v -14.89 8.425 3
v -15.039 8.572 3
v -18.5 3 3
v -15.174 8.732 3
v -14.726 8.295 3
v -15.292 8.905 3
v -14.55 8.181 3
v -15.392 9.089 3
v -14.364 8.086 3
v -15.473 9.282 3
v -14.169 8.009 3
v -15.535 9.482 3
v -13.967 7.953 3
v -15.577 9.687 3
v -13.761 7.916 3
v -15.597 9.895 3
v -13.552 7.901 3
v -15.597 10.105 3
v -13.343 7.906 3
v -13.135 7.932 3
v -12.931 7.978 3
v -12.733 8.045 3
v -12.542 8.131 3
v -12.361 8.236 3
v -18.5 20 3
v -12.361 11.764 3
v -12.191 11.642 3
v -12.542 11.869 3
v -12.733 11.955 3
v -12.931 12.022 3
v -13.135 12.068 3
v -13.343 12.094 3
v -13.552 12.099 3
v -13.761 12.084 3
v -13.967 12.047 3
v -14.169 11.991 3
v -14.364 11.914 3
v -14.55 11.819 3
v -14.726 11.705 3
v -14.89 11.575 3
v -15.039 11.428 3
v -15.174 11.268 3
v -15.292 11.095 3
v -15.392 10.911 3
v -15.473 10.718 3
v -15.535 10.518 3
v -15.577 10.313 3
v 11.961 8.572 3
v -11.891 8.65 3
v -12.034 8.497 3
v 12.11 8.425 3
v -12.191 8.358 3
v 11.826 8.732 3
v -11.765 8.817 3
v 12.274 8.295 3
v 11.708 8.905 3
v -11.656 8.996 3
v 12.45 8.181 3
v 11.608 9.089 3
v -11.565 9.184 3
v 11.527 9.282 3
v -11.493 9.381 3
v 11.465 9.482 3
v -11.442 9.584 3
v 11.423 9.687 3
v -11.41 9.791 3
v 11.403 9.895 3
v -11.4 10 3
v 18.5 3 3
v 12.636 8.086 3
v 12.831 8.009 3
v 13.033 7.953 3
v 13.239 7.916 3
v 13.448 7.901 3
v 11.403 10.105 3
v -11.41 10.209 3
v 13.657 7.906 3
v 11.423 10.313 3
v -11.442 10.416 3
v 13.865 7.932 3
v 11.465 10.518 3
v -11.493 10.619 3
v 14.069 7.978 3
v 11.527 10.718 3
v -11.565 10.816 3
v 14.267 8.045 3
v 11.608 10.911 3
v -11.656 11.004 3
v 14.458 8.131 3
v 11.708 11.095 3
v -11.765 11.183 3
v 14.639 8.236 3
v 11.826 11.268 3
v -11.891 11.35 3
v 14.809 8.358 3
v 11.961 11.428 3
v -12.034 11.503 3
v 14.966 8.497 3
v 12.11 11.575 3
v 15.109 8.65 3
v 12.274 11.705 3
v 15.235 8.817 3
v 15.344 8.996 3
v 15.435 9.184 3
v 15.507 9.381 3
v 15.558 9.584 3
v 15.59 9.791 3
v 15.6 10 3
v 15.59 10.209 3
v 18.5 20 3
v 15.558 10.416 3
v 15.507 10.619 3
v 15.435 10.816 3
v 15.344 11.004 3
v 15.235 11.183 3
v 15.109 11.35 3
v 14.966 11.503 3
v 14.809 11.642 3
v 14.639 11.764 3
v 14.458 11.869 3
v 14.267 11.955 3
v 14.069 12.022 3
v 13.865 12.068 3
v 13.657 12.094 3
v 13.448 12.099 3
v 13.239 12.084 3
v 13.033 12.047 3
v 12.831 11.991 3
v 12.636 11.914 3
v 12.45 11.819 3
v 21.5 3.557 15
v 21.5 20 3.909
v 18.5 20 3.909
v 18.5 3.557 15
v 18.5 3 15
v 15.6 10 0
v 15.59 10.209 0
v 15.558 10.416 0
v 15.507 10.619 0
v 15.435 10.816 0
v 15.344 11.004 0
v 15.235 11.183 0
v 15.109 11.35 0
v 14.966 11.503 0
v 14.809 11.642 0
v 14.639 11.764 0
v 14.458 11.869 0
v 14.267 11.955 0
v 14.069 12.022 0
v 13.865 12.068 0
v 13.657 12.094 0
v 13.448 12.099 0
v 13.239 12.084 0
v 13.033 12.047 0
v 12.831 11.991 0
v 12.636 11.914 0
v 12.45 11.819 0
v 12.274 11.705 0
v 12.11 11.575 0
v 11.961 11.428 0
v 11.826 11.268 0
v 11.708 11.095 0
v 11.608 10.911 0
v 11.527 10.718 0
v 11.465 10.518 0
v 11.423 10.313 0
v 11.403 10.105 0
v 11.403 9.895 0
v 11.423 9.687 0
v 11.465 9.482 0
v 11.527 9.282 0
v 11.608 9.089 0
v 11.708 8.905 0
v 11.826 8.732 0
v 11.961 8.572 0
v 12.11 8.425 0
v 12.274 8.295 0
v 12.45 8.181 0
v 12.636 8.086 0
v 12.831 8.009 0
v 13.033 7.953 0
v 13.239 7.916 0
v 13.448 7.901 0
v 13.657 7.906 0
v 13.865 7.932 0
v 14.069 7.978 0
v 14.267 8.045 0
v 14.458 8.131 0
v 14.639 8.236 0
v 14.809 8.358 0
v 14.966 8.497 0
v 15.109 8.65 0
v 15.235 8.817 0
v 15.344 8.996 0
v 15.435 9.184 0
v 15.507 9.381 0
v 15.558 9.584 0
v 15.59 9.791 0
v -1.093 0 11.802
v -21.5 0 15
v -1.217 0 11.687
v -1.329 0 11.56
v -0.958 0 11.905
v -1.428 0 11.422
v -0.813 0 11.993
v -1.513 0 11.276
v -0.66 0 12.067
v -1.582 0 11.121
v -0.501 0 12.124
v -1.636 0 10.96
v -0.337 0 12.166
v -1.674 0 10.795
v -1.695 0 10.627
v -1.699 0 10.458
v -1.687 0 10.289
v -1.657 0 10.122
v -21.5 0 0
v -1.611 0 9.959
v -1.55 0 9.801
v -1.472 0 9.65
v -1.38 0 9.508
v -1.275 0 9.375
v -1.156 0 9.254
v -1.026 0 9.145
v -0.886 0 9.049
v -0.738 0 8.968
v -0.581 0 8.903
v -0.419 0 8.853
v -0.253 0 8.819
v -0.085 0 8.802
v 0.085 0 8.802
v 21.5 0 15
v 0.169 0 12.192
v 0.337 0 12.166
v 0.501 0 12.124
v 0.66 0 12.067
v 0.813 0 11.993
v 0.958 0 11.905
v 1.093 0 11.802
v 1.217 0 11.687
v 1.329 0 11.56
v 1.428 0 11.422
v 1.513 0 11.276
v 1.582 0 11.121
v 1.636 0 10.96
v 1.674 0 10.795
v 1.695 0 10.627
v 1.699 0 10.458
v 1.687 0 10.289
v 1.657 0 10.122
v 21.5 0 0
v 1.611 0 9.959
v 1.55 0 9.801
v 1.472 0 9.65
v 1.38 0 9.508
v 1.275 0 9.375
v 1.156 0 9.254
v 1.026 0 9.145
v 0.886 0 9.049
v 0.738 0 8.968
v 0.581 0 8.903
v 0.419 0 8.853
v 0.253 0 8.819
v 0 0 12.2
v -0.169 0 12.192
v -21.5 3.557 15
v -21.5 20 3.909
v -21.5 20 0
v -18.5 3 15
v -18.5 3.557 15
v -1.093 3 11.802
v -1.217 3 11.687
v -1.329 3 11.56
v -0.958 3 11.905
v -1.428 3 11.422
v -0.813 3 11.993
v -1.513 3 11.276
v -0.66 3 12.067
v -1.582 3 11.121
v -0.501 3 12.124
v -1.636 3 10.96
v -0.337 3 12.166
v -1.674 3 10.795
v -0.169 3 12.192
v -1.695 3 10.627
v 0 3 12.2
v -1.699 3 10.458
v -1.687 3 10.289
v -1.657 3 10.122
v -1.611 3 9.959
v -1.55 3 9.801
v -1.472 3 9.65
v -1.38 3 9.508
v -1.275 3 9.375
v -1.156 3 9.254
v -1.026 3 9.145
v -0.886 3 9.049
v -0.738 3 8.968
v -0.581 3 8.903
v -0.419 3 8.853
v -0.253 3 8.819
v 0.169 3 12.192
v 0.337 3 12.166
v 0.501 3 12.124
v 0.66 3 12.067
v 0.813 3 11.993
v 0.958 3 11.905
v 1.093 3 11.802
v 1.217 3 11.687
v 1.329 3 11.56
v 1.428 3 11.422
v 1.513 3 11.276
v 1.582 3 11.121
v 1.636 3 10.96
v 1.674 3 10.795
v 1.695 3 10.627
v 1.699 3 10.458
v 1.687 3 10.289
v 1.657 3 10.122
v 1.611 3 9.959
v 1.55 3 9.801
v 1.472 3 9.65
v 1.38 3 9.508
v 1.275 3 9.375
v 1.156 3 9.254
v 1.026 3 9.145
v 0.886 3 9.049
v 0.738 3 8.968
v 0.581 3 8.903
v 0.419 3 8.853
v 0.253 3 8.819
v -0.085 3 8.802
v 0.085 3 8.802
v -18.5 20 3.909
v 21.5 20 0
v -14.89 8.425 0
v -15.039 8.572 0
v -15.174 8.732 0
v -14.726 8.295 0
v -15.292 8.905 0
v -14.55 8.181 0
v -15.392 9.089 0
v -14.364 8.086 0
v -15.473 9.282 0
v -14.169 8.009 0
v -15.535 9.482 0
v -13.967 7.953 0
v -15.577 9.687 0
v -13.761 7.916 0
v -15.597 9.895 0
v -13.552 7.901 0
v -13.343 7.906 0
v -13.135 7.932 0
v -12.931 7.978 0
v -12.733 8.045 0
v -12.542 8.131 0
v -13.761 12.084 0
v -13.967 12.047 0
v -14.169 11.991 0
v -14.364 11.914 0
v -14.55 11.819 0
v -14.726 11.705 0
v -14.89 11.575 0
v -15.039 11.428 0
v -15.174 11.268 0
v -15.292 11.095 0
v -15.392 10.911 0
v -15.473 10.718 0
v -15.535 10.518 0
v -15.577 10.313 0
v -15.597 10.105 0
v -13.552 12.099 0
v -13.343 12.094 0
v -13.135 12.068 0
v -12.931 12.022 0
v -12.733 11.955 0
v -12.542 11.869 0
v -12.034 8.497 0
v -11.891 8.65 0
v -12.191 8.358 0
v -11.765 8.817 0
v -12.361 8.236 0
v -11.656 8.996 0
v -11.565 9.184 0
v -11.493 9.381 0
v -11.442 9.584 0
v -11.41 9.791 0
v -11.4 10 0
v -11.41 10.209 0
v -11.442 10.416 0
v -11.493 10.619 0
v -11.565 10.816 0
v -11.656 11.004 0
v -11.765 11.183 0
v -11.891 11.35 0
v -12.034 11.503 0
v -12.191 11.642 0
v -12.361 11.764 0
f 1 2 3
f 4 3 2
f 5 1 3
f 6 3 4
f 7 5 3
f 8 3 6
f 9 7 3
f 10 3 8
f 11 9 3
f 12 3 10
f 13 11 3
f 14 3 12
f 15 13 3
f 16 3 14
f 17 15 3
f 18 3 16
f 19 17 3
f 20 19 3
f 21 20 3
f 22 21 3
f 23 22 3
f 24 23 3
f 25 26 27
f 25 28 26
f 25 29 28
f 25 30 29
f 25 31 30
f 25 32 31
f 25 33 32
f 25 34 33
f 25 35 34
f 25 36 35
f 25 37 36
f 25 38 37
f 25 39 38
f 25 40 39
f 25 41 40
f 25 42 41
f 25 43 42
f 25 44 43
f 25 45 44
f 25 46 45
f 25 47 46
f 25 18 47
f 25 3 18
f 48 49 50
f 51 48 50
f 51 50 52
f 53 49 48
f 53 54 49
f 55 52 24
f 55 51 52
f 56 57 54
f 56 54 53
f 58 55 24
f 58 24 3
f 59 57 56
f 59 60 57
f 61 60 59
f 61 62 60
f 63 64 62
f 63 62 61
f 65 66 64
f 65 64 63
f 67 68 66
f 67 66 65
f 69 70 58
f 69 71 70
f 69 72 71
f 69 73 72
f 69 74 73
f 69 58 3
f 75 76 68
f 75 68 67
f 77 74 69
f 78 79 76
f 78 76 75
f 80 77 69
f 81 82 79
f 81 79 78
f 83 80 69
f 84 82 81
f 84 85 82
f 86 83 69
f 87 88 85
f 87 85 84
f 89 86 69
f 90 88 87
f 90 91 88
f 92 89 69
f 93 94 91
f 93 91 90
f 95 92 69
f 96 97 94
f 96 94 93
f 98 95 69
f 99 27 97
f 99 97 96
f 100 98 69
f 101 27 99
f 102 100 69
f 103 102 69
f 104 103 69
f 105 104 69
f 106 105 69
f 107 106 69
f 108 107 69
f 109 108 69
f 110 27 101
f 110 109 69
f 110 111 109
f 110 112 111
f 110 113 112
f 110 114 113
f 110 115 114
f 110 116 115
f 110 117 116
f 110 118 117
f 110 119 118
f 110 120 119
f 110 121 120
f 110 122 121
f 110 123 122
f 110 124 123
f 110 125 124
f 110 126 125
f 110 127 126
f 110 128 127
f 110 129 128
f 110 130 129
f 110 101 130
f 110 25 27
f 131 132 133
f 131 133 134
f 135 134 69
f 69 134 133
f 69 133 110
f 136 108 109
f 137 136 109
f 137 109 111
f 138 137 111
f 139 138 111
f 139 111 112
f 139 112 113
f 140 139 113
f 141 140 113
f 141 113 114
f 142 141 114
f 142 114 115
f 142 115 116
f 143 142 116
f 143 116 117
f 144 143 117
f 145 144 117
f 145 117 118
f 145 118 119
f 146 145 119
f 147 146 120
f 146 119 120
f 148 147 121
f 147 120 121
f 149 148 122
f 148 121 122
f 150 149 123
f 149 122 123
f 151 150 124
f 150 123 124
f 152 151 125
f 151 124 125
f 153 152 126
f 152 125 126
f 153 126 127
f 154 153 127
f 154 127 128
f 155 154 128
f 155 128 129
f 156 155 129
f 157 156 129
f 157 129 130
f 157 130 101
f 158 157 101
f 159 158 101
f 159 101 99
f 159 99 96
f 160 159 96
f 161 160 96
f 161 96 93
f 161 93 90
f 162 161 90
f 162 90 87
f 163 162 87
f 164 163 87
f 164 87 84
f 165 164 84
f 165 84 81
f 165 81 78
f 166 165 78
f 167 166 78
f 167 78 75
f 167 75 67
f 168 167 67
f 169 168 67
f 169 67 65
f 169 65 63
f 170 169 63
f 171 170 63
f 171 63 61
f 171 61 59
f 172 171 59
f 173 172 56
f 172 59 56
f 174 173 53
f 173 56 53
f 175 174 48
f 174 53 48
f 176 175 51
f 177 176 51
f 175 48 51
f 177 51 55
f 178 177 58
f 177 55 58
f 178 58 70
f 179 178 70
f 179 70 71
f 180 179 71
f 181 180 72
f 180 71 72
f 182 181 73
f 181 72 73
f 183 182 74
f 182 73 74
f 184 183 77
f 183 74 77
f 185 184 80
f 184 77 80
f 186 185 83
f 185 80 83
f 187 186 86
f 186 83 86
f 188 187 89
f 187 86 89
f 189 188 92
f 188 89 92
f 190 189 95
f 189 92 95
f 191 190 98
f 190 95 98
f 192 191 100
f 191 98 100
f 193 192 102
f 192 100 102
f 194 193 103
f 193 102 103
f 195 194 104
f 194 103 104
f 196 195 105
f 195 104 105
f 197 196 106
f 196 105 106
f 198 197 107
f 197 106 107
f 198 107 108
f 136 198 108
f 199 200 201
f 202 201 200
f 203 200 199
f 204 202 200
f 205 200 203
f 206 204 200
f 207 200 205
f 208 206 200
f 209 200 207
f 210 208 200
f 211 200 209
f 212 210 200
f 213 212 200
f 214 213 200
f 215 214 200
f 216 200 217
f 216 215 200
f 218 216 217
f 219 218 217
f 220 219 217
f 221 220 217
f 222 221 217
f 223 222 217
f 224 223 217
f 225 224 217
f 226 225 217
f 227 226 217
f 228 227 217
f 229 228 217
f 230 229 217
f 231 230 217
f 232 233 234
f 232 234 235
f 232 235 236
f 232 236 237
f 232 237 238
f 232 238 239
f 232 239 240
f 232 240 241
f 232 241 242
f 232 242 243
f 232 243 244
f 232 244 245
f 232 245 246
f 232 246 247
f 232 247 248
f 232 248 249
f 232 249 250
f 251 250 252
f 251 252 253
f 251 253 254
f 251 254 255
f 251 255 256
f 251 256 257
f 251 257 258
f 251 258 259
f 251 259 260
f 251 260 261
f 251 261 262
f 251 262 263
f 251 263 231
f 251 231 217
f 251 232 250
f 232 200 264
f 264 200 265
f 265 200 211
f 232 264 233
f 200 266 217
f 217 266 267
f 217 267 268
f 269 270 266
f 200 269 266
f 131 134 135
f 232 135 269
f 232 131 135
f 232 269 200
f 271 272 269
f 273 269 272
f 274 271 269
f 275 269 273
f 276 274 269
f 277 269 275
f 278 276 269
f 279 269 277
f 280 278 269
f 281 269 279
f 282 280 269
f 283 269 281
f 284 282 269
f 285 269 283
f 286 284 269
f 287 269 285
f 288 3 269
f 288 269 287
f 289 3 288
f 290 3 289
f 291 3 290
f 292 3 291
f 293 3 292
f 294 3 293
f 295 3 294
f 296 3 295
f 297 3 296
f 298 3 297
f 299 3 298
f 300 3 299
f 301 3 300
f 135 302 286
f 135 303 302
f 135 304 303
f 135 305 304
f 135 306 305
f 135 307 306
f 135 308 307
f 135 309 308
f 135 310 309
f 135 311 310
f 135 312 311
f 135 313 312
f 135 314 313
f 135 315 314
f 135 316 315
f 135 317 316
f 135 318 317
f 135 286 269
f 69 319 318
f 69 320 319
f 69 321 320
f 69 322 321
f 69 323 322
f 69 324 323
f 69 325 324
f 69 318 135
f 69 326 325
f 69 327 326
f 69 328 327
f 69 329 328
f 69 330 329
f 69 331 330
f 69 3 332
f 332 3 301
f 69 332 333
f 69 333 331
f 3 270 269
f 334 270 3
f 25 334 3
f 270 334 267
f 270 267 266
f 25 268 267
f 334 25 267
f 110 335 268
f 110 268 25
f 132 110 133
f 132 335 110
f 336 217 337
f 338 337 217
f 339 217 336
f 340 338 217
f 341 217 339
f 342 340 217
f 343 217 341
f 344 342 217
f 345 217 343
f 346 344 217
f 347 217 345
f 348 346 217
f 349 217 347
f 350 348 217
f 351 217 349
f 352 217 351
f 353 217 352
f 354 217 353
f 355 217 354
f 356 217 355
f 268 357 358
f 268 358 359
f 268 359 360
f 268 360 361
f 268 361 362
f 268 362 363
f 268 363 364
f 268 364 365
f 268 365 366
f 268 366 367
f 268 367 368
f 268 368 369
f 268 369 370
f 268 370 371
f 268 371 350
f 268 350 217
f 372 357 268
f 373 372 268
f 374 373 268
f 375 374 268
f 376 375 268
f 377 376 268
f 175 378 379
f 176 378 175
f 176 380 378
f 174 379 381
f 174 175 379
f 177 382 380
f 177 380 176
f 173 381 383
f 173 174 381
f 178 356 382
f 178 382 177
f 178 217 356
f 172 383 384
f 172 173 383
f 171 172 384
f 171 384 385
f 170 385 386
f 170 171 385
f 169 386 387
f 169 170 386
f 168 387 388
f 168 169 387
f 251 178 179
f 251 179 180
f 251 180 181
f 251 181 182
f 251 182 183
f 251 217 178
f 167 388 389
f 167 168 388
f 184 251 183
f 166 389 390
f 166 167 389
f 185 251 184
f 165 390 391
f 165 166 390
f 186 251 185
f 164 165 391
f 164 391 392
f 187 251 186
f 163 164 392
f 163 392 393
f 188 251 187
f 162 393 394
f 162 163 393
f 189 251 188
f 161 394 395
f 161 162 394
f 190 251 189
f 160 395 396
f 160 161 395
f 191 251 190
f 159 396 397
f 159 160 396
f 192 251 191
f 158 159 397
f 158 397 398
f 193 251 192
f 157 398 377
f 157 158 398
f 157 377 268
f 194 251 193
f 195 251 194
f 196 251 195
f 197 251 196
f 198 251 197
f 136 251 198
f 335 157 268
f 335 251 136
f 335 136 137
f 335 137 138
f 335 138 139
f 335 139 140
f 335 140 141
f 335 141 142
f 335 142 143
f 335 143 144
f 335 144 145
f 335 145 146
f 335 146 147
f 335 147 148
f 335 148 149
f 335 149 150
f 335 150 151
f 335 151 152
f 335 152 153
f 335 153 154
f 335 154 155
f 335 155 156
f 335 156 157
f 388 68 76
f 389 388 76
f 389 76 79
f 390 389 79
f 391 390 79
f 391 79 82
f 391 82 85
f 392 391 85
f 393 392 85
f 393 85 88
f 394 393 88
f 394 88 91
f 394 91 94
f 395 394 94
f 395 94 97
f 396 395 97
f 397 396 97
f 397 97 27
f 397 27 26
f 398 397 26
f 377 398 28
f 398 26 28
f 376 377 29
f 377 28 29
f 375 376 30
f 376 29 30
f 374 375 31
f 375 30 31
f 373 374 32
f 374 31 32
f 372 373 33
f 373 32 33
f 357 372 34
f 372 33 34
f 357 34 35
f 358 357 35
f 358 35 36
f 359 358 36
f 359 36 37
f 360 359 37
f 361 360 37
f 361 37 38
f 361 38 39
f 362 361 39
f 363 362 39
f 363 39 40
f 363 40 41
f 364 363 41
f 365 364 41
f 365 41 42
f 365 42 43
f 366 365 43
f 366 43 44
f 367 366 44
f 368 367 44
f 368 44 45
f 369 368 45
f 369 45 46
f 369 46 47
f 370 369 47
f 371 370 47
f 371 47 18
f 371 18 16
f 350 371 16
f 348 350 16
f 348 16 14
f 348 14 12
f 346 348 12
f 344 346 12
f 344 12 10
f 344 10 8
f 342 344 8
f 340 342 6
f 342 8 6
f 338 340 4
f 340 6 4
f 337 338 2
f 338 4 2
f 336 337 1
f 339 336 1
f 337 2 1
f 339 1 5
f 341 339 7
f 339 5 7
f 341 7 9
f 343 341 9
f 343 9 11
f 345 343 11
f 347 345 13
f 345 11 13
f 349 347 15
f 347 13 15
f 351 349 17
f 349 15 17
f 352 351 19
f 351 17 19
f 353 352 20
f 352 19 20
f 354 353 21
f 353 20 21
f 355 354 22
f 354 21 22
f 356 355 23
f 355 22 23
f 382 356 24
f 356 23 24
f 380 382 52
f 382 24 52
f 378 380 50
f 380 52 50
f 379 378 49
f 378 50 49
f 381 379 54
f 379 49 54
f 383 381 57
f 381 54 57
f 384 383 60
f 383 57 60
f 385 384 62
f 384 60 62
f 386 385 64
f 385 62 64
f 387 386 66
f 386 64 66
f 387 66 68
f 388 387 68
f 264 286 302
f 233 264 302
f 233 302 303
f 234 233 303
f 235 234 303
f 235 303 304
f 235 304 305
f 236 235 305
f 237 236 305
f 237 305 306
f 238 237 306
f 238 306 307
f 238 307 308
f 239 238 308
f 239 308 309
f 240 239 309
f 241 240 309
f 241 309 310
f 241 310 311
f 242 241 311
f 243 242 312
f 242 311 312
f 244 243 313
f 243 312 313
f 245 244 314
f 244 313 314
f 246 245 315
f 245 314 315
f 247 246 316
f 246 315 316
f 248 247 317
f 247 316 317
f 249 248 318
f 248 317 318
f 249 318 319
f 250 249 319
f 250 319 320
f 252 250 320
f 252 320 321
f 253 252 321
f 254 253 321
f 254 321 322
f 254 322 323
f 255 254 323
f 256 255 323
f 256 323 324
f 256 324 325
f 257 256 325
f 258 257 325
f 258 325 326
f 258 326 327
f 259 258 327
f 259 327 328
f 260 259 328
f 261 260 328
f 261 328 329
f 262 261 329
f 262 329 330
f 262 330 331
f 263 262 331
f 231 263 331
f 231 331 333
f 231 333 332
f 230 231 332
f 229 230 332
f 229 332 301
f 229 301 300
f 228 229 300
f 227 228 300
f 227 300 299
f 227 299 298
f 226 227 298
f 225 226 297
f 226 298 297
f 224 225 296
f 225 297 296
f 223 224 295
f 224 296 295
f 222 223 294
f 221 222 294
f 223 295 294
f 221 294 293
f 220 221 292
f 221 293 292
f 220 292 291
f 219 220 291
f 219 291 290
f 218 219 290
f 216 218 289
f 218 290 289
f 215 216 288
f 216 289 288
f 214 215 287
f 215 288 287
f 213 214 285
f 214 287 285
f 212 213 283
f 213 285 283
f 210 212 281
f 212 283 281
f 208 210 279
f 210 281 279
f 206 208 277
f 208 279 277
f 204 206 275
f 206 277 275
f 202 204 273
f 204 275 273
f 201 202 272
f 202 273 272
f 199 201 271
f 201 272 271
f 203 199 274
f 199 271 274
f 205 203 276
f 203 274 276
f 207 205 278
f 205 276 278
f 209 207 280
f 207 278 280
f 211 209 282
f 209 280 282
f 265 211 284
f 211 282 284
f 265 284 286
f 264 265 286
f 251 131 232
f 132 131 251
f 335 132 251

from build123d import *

# Parameters (mm, degrees)
BOSS_EXTRUDE3_DEPTH = 21.5
SKETCH4_W           = 37
SKETCH4_H           = 12
CUT_EXTRUDE1_DEPTH  = 17
SKETCH5_R           = 2.1
CUT_EXTRUDE2_DEPTH  = 32.721443851
SKETCH6_R           = 1.7
CUT_EXTRUDE3_DEPTH  = 32.2449996


with BuildPart() as part:
    # Sketch3 → Boss-Extrude3 (new, symmetric)
    with BuildSketch(Plane(origin=(0, 0, 0), x_dir=(0, 0, -1), z_dir=(1, 0, 0))):
        Polygon((0, 0), (0, 20), (-3.90885, 20), (-15, 3.55669), (-15, 0), align=None)
    extrude(amount=BOSS_EXTRUDE3_DEPTH, both=True)

    # Sketch4 → Cut-Extrude1 (cut)
    with BuildSketch(Plane(origin=(0, 20, 0), x_dir=(1, 0, 0), z_dir=(0, 1, 0))):
        with Locations((0, -9)):
            Rectangle(SKETCH4_W, SKETCH4_H)
    extrude(amount=-CUT_EXTRUDE1_DEPTH, mode=Mode.SUBTRACT)

    # Sketch5 → Cut-Extrude2 (cut, through all)
    with BuildSketch(Plane.XY.offset(3)):
        with Locations((-13.5, 10)):
            Circle(SKETCH5_R)
        with Locations((13.5, 10)):
            Circle(SKETCH5_R)
    extrude(amount=-CUT_EXTRUDE2_DEPTH, mode=Mode.SUBTRACT)

    # Sketch6 → Cut-Extrude3 (cut, through all)
    with BuildSketch(Plane(origin=(0, 3, 0), x_dir=(1, 0, 0), z_dir=(0, 1, 0))):
        with Locations(Location((0, -10.5, 0), (0, 0, 270))):
            Circle(SKETCH6_R)
    extrude(amount=-CUT_EXTRUDE3_DEPTH, mode=Mode.SUBTRACT)


solid = part.part
